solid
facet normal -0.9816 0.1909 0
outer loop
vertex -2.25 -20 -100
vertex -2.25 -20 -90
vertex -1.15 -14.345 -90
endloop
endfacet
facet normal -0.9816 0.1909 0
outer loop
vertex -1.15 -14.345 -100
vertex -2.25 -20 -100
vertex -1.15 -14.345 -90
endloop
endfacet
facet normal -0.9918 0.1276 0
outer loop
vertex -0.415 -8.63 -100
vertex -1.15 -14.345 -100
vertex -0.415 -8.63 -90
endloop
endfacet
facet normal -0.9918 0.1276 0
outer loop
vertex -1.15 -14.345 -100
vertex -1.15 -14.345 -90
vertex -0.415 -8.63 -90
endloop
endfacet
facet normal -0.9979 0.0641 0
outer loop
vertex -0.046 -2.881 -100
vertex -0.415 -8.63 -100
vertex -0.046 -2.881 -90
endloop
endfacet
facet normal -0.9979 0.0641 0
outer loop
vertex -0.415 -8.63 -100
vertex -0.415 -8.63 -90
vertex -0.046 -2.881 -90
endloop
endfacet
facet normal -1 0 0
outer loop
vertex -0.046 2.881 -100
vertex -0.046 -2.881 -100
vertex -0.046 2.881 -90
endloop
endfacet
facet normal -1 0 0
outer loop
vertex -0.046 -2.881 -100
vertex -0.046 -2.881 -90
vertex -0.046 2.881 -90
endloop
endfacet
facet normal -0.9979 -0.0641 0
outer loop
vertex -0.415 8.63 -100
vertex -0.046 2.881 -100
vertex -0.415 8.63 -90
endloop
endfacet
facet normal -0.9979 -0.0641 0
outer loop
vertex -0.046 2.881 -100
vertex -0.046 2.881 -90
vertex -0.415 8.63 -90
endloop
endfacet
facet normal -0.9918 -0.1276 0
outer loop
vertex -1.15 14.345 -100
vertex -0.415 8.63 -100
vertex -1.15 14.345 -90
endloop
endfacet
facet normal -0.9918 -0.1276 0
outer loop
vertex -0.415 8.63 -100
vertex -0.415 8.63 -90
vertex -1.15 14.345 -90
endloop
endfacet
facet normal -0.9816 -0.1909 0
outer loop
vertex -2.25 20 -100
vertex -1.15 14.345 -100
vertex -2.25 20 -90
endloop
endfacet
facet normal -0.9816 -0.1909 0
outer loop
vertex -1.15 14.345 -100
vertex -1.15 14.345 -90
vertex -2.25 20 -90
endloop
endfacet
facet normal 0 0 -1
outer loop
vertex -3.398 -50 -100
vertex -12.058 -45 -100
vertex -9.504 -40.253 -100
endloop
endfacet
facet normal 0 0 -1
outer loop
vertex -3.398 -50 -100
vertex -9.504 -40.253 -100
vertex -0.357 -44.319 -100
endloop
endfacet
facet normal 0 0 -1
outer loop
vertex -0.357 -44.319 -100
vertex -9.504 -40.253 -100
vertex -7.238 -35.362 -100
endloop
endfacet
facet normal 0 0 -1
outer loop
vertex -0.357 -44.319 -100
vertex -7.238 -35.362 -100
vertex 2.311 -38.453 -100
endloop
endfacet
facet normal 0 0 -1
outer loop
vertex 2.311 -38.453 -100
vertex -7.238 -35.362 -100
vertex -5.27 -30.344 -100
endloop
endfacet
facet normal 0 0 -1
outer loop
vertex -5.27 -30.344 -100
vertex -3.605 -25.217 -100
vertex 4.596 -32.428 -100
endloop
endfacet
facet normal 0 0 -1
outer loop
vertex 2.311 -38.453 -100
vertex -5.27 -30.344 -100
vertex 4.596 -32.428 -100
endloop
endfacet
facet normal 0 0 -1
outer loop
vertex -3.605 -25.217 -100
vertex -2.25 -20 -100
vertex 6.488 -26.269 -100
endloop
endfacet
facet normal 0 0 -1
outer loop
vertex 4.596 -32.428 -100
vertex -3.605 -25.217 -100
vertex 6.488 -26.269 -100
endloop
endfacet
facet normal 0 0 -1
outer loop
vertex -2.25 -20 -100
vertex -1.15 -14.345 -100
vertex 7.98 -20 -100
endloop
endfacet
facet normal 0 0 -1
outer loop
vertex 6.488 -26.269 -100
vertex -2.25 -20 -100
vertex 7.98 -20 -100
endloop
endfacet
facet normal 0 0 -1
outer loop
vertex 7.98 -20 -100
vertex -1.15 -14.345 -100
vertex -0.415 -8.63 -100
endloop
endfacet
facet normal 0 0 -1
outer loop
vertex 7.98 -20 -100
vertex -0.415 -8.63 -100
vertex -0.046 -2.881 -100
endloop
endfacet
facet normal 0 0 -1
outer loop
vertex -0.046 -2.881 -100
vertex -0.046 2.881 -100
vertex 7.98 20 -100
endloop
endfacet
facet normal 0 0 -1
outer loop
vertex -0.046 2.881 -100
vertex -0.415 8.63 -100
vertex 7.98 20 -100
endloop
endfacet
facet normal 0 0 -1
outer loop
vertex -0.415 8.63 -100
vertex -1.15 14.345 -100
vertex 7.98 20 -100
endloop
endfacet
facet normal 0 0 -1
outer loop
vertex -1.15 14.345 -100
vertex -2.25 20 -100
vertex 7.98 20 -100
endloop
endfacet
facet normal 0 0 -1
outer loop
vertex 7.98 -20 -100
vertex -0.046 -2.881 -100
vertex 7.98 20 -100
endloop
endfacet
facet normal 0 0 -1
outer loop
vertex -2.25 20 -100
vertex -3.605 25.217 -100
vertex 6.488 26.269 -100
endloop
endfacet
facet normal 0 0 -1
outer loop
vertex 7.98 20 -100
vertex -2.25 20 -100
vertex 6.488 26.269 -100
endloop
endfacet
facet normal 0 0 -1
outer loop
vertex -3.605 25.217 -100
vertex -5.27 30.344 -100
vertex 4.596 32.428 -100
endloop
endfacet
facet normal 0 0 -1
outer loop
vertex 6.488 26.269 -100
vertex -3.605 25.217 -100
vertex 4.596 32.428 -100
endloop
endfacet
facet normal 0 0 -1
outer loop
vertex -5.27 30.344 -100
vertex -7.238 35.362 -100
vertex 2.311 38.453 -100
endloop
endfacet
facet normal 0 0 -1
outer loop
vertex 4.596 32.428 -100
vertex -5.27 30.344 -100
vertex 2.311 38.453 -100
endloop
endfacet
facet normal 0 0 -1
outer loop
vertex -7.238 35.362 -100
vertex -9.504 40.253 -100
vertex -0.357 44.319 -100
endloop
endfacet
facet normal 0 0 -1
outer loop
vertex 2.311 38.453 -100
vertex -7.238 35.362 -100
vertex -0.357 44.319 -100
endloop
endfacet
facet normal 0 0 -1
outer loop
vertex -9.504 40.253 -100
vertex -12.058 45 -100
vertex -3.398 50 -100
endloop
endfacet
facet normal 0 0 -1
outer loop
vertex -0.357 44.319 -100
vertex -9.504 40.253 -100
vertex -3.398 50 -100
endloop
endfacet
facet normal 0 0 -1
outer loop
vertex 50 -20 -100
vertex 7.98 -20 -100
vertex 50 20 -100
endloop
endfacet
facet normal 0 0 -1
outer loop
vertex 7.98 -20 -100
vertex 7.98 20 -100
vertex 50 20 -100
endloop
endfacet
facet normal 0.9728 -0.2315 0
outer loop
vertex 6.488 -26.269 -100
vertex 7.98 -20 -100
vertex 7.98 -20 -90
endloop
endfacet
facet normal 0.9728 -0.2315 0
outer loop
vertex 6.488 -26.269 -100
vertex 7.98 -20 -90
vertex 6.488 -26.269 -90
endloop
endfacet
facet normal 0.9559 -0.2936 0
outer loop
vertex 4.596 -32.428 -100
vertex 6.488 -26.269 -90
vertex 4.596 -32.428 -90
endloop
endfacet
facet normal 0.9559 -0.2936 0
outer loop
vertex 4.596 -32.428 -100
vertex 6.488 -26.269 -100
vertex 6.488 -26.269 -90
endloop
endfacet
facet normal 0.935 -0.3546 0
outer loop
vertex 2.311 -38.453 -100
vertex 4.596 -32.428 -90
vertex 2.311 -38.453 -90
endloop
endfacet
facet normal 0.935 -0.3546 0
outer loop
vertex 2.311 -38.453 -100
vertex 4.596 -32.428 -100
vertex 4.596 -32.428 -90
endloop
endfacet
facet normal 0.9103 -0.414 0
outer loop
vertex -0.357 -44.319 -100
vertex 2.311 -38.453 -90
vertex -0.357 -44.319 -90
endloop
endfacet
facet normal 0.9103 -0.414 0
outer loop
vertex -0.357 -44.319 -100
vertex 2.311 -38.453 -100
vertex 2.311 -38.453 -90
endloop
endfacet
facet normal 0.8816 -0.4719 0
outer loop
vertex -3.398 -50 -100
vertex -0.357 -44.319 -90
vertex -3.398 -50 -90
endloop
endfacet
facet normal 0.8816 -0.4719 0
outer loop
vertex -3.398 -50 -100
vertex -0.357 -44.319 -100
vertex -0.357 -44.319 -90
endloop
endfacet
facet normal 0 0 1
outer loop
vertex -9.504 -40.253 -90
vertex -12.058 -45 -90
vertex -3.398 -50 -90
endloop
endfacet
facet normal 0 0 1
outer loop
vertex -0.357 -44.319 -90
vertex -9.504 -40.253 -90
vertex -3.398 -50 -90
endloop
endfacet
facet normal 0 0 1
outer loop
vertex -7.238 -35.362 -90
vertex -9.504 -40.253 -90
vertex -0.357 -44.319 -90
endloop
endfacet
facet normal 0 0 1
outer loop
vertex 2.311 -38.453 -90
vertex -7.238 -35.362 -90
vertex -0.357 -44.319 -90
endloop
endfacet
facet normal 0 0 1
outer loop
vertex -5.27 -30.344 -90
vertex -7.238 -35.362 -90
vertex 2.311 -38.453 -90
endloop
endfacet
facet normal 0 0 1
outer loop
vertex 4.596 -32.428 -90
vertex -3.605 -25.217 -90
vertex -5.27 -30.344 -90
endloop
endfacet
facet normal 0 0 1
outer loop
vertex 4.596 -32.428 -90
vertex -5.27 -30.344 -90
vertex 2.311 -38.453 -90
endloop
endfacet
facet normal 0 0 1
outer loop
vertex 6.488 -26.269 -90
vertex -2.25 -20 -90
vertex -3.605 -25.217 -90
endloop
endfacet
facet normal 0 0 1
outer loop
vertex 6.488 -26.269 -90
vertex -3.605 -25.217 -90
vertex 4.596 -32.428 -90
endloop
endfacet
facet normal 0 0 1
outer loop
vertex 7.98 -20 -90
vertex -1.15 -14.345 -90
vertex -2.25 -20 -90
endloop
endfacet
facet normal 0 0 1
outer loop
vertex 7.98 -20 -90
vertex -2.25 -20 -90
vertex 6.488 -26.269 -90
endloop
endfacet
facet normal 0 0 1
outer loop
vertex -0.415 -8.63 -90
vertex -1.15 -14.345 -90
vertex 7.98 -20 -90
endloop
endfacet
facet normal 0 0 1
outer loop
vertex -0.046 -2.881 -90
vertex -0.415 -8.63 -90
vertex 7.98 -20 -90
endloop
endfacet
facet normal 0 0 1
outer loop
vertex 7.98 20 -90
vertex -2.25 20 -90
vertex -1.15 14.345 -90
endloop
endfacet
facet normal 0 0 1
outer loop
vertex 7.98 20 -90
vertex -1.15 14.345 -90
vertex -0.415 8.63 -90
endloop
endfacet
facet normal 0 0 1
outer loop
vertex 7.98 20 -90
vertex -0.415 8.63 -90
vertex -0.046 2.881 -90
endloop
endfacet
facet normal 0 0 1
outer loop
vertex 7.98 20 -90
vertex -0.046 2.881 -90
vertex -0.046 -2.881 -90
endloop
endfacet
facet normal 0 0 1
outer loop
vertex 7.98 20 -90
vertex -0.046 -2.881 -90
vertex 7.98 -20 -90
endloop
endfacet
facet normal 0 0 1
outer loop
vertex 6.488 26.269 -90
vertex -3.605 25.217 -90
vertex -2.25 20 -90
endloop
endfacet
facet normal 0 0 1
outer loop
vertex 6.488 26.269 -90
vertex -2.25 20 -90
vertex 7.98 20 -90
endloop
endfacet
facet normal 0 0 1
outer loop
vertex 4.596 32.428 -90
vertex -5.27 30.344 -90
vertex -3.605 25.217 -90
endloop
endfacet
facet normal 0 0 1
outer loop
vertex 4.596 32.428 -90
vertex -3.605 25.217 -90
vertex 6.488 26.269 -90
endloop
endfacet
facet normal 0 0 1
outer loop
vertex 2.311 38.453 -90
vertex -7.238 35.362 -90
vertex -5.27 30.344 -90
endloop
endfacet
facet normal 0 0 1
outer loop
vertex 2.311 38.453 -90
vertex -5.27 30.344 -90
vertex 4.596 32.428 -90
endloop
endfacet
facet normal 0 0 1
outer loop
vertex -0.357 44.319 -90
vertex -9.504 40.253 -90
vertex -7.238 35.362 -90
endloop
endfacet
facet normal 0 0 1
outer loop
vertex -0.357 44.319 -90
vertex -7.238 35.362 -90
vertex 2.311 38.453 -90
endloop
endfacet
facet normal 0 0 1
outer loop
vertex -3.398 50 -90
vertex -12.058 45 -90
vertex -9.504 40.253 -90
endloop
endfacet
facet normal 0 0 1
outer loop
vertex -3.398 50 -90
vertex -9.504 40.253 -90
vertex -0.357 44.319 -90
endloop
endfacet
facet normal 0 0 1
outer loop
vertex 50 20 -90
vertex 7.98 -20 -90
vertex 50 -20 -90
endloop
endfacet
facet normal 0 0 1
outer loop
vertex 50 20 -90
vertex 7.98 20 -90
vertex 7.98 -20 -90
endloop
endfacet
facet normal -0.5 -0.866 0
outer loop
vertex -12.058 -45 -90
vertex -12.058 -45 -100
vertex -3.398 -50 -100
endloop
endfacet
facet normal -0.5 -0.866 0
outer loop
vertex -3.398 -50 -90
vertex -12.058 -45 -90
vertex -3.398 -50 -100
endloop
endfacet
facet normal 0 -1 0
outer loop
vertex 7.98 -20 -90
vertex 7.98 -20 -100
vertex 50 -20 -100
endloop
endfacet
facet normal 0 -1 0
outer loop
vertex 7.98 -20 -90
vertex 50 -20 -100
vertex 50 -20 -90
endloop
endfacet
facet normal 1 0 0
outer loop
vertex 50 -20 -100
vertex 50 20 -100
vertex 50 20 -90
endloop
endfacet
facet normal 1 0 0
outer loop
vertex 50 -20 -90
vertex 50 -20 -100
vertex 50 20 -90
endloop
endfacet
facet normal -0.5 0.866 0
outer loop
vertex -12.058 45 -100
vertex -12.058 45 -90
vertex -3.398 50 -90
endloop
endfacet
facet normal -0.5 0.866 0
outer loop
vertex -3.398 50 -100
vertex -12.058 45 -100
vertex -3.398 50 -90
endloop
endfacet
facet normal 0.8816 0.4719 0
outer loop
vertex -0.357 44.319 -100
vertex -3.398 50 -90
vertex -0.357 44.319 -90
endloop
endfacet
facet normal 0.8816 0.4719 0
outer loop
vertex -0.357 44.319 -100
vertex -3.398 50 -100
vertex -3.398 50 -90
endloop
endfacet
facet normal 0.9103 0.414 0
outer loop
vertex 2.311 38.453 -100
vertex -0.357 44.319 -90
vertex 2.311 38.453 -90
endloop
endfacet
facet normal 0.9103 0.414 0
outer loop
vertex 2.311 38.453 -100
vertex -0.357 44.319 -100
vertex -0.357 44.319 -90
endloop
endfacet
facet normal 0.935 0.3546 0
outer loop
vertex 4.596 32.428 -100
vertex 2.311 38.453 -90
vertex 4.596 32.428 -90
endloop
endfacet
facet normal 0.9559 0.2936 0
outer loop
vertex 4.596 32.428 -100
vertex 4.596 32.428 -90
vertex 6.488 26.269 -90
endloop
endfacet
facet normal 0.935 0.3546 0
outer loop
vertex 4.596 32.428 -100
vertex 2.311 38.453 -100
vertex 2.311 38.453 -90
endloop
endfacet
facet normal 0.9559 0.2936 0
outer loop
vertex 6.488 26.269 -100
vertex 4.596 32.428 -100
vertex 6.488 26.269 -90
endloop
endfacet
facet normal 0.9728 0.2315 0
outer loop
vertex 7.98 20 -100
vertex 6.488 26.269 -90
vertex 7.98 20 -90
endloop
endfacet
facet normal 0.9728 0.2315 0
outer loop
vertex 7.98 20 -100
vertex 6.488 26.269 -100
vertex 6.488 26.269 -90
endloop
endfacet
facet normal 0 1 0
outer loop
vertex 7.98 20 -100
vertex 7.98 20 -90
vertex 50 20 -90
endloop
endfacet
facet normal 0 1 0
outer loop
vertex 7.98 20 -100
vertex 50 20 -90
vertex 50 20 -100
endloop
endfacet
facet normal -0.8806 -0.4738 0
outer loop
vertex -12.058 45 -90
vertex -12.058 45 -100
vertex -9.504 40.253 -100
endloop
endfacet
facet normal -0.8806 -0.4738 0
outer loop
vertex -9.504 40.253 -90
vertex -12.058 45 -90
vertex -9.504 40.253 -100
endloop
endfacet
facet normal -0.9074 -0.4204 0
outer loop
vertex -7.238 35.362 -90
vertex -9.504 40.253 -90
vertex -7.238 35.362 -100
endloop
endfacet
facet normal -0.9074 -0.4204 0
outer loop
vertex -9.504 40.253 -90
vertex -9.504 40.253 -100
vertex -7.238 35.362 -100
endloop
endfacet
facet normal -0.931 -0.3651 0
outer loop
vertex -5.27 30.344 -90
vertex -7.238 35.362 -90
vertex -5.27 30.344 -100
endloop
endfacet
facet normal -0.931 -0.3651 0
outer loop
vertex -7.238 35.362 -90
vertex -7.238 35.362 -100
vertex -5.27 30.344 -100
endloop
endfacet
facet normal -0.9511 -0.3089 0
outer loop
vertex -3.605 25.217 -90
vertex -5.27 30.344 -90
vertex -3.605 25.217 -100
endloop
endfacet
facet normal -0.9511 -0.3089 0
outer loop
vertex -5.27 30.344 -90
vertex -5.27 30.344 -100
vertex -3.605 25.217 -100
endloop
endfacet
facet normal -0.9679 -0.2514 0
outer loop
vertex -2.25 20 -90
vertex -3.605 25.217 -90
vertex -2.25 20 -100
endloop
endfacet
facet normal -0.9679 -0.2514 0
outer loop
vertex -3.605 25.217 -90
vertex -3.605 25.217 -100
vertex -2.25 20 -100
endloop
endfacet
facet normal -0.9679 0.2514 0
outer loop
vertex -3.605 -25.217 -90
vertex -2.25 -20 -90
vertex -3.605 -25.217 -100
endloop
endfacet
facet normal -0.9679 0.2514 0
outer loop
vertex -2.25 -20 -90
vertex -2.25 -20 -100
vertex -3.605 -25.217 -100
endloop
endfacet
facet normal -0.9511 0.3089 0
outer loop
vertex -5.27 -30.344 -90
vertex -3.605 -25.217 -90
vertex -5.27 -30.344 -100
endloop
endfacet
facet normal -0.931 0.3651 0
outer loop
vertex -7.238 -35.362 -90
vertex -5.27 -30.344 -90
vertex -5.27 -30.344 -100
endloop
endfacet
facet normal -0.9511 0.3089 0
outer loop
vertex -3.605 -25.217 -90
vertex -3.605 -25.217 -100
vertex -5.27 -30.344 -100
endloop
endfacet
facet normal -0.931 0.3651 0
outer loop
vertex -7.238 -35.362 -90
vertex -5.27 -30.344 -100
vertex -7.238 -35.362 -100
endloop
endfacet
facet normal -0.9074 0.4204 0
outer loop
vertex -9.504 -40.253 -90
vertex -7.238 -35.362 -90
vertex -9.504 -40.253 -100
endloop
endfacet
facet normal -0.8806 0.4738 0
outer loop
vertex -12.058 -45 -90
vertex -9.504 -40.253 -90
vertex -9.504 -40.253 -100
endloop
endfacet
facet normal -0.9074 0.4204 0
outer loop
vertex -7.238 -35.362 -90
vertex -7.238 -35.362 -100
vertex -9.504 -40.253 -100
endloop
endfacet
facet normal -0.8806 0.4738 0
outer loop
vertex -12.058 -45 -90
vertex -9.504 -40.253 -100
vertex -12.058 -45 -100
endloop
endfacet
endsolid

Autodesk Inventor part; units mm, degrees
ref_plane "YZ Plane" through (0, 0, 0) normal (1, 0, 0) x (0, 1, 0)
ref_plane "XZ Plane" through (0, 0, 0) normal (0, 1, 0) x (-1, 0, 0)
ref_plane "XY Plane" through (0, 0, 0) normal (0, 0, 1) x (1, 0, 0)
sketch "Skizze1" plane through (0, 0, 0) normal (1, 0, 0) x (0, 1, 0)
  line L0 (-10, -10) -> (-10, -5)
  line L1 (-10, -5) -> (-15, -5)
  line L2 (-15, -5) -> (-15, 0)
  line L3 (-15, 0) -> (15, 0)
  line L4 (15, 0) -> (15, -5)
  line L5 (15, -5) -> (10, -5)
  line L6 (10, -5) -> (10, -10)
  line L7 (10, -10) -> (20, -10)
  line L8 (20, -10) -> (20, -30)
  line L9 (20, -30) -> (-20, -30)
  line L10 (-20, -30) -> (-20, -10)
  line L11 (-20, -10) -> (-10, -10)
  line L12 (0, -36) -> (0, 6) projected
  point P0 (0, 0)
  dimension "d0" = 30
  dimension "d1" = 20
  dimension "d2" = 5
  dimension "d3" = 5
  dimension "d4" = 20
  dimension "d5" = 90
  dimension "d6" = 40
extrude "Extrusion1" add sketch "Skizze1" along normal blind 10
sketch "Skizze3" plane through (0, 20, -10) normal (0, 1, 0) x (1, 0, 0)
  line L0 (0, 0) -> (0, 20) projected
  line L1 (0, 20) -> (40, 20)
  line L2 (40, 20) -> (40, 80)
  line L3 (40, 80) -> (-10, 80)
  line L4 (-10, 80) -> (-10, 90)
  line L5 (-10, 90) -> (50, 90)
  line L6 (50, 90) -> (50, 10)
  line L7 (50, 10) -> (0, 10)
  point P0 (0, -10)
  dimension "d12" = 10
  dimension "d13" = 10
  dimension "d14" = 10
  dimension "d15" = 60
  dimension "d16" = 50
  dimension "d17" = 60
extrude "Extrusion3" add sketch "Skizze3" against normal up to surface (40 mm away)
sketch "Skizze4" plane through (50, 20, -100) normal (0, 0, -1) x (-1, 0, 0)
  arc A0 (53.3975, 30) -> (53.3975, -70) centre (140, -20) ccw
  arc A1 (62.0577, 25) -> (62.0577, -65) centre (140, -20) ccw
  line L0 (140, -20) -> (53.3975, -70)
  line L1 (140, -20) -> (53.3975, 30)
  line L2 (0, -40) -> (60, -40) projected
  line L3 (0, 0) -> (60, 0) projected
  line L4 (0, 0) -> (0, -40) projected
  point P0 (40, -20)
  point P1 (42.0204, 0)
  point P2 (52.2504, 0)
  point P3 (52.2504, -40)
  point P4 (42.0204, -40)
  dimension "d20" = 200
  dimension "d21" = 180
  dimension "d22" = 30
  dimension "d23" = 30
  dimension "d24" = 40
  dimension "d25" = 20
  dimension "d30" = 140
extrude "Extrusion4" add sketch "Skizze4" against normal up to surface (10 mm away) contours L1 A1 L3 A0 | L2 A1 L0 A0
sketch "Skizze5" plane through (40, -20, -90) normal (0, 0, 1) x (1, 0, 0)
  arc A0 (-42.2504, 40) -> (-52.0577, 65) centre (-130, 20) ccw projected
  circle A1 centre (-130, 20) radius 90
  point P0 (-40, 20)
  point P1 (-52.0577, 65)
  point P2 (-42.2504, 40)
extrude "Extrusion5" cut sketch "Skizze5" against normal up to surface (10 mm away)
sketch "Skizze6" plane through (40, -20, -90) normal (0, 0, 1) x (1, 0, 0)
  arc A0 (-52.0577, -25) -> (-52.0577, 65) centre (-130, 20) ccw projected
  line L0 (-43.3975, -30) -> (-52.0577, -25) projected
  arc A1 (-43.3975, -30) -> (-32.0204, 0) centre (-130, 20) ccw projected
  line L1 (-32.0204, 0) -> (0, 0) projected
  line L2 (0, 40) -> (0, 0) projected
  line L3 (-32.0204, 40) -> (0, 40) projected
  arc A2 (-32.0204, 40) -> (-43.3975, 70) centre (-130, 20) ccw projected
  line L4 (-52.0577, 65) -> (-43.3975, 70) projected
  line L5 (-30, 0) -> (-30, 40) projected
  line L6 (-30, 0) -> (10, 0) projected
  line L7 (10, 40) -> (10, 0) projected
  line L8 (-30, 40) -> (10, 40) projected
  point P0 (-40, 20)
extrude "Extrusion6" cut sketch "Skizze6" along normal through all
equation "\"d13\" = d12"
equation "\"d23\" = d22"
equation "\"d25\" = 0.5 * d24"
properties part number "Finger"
